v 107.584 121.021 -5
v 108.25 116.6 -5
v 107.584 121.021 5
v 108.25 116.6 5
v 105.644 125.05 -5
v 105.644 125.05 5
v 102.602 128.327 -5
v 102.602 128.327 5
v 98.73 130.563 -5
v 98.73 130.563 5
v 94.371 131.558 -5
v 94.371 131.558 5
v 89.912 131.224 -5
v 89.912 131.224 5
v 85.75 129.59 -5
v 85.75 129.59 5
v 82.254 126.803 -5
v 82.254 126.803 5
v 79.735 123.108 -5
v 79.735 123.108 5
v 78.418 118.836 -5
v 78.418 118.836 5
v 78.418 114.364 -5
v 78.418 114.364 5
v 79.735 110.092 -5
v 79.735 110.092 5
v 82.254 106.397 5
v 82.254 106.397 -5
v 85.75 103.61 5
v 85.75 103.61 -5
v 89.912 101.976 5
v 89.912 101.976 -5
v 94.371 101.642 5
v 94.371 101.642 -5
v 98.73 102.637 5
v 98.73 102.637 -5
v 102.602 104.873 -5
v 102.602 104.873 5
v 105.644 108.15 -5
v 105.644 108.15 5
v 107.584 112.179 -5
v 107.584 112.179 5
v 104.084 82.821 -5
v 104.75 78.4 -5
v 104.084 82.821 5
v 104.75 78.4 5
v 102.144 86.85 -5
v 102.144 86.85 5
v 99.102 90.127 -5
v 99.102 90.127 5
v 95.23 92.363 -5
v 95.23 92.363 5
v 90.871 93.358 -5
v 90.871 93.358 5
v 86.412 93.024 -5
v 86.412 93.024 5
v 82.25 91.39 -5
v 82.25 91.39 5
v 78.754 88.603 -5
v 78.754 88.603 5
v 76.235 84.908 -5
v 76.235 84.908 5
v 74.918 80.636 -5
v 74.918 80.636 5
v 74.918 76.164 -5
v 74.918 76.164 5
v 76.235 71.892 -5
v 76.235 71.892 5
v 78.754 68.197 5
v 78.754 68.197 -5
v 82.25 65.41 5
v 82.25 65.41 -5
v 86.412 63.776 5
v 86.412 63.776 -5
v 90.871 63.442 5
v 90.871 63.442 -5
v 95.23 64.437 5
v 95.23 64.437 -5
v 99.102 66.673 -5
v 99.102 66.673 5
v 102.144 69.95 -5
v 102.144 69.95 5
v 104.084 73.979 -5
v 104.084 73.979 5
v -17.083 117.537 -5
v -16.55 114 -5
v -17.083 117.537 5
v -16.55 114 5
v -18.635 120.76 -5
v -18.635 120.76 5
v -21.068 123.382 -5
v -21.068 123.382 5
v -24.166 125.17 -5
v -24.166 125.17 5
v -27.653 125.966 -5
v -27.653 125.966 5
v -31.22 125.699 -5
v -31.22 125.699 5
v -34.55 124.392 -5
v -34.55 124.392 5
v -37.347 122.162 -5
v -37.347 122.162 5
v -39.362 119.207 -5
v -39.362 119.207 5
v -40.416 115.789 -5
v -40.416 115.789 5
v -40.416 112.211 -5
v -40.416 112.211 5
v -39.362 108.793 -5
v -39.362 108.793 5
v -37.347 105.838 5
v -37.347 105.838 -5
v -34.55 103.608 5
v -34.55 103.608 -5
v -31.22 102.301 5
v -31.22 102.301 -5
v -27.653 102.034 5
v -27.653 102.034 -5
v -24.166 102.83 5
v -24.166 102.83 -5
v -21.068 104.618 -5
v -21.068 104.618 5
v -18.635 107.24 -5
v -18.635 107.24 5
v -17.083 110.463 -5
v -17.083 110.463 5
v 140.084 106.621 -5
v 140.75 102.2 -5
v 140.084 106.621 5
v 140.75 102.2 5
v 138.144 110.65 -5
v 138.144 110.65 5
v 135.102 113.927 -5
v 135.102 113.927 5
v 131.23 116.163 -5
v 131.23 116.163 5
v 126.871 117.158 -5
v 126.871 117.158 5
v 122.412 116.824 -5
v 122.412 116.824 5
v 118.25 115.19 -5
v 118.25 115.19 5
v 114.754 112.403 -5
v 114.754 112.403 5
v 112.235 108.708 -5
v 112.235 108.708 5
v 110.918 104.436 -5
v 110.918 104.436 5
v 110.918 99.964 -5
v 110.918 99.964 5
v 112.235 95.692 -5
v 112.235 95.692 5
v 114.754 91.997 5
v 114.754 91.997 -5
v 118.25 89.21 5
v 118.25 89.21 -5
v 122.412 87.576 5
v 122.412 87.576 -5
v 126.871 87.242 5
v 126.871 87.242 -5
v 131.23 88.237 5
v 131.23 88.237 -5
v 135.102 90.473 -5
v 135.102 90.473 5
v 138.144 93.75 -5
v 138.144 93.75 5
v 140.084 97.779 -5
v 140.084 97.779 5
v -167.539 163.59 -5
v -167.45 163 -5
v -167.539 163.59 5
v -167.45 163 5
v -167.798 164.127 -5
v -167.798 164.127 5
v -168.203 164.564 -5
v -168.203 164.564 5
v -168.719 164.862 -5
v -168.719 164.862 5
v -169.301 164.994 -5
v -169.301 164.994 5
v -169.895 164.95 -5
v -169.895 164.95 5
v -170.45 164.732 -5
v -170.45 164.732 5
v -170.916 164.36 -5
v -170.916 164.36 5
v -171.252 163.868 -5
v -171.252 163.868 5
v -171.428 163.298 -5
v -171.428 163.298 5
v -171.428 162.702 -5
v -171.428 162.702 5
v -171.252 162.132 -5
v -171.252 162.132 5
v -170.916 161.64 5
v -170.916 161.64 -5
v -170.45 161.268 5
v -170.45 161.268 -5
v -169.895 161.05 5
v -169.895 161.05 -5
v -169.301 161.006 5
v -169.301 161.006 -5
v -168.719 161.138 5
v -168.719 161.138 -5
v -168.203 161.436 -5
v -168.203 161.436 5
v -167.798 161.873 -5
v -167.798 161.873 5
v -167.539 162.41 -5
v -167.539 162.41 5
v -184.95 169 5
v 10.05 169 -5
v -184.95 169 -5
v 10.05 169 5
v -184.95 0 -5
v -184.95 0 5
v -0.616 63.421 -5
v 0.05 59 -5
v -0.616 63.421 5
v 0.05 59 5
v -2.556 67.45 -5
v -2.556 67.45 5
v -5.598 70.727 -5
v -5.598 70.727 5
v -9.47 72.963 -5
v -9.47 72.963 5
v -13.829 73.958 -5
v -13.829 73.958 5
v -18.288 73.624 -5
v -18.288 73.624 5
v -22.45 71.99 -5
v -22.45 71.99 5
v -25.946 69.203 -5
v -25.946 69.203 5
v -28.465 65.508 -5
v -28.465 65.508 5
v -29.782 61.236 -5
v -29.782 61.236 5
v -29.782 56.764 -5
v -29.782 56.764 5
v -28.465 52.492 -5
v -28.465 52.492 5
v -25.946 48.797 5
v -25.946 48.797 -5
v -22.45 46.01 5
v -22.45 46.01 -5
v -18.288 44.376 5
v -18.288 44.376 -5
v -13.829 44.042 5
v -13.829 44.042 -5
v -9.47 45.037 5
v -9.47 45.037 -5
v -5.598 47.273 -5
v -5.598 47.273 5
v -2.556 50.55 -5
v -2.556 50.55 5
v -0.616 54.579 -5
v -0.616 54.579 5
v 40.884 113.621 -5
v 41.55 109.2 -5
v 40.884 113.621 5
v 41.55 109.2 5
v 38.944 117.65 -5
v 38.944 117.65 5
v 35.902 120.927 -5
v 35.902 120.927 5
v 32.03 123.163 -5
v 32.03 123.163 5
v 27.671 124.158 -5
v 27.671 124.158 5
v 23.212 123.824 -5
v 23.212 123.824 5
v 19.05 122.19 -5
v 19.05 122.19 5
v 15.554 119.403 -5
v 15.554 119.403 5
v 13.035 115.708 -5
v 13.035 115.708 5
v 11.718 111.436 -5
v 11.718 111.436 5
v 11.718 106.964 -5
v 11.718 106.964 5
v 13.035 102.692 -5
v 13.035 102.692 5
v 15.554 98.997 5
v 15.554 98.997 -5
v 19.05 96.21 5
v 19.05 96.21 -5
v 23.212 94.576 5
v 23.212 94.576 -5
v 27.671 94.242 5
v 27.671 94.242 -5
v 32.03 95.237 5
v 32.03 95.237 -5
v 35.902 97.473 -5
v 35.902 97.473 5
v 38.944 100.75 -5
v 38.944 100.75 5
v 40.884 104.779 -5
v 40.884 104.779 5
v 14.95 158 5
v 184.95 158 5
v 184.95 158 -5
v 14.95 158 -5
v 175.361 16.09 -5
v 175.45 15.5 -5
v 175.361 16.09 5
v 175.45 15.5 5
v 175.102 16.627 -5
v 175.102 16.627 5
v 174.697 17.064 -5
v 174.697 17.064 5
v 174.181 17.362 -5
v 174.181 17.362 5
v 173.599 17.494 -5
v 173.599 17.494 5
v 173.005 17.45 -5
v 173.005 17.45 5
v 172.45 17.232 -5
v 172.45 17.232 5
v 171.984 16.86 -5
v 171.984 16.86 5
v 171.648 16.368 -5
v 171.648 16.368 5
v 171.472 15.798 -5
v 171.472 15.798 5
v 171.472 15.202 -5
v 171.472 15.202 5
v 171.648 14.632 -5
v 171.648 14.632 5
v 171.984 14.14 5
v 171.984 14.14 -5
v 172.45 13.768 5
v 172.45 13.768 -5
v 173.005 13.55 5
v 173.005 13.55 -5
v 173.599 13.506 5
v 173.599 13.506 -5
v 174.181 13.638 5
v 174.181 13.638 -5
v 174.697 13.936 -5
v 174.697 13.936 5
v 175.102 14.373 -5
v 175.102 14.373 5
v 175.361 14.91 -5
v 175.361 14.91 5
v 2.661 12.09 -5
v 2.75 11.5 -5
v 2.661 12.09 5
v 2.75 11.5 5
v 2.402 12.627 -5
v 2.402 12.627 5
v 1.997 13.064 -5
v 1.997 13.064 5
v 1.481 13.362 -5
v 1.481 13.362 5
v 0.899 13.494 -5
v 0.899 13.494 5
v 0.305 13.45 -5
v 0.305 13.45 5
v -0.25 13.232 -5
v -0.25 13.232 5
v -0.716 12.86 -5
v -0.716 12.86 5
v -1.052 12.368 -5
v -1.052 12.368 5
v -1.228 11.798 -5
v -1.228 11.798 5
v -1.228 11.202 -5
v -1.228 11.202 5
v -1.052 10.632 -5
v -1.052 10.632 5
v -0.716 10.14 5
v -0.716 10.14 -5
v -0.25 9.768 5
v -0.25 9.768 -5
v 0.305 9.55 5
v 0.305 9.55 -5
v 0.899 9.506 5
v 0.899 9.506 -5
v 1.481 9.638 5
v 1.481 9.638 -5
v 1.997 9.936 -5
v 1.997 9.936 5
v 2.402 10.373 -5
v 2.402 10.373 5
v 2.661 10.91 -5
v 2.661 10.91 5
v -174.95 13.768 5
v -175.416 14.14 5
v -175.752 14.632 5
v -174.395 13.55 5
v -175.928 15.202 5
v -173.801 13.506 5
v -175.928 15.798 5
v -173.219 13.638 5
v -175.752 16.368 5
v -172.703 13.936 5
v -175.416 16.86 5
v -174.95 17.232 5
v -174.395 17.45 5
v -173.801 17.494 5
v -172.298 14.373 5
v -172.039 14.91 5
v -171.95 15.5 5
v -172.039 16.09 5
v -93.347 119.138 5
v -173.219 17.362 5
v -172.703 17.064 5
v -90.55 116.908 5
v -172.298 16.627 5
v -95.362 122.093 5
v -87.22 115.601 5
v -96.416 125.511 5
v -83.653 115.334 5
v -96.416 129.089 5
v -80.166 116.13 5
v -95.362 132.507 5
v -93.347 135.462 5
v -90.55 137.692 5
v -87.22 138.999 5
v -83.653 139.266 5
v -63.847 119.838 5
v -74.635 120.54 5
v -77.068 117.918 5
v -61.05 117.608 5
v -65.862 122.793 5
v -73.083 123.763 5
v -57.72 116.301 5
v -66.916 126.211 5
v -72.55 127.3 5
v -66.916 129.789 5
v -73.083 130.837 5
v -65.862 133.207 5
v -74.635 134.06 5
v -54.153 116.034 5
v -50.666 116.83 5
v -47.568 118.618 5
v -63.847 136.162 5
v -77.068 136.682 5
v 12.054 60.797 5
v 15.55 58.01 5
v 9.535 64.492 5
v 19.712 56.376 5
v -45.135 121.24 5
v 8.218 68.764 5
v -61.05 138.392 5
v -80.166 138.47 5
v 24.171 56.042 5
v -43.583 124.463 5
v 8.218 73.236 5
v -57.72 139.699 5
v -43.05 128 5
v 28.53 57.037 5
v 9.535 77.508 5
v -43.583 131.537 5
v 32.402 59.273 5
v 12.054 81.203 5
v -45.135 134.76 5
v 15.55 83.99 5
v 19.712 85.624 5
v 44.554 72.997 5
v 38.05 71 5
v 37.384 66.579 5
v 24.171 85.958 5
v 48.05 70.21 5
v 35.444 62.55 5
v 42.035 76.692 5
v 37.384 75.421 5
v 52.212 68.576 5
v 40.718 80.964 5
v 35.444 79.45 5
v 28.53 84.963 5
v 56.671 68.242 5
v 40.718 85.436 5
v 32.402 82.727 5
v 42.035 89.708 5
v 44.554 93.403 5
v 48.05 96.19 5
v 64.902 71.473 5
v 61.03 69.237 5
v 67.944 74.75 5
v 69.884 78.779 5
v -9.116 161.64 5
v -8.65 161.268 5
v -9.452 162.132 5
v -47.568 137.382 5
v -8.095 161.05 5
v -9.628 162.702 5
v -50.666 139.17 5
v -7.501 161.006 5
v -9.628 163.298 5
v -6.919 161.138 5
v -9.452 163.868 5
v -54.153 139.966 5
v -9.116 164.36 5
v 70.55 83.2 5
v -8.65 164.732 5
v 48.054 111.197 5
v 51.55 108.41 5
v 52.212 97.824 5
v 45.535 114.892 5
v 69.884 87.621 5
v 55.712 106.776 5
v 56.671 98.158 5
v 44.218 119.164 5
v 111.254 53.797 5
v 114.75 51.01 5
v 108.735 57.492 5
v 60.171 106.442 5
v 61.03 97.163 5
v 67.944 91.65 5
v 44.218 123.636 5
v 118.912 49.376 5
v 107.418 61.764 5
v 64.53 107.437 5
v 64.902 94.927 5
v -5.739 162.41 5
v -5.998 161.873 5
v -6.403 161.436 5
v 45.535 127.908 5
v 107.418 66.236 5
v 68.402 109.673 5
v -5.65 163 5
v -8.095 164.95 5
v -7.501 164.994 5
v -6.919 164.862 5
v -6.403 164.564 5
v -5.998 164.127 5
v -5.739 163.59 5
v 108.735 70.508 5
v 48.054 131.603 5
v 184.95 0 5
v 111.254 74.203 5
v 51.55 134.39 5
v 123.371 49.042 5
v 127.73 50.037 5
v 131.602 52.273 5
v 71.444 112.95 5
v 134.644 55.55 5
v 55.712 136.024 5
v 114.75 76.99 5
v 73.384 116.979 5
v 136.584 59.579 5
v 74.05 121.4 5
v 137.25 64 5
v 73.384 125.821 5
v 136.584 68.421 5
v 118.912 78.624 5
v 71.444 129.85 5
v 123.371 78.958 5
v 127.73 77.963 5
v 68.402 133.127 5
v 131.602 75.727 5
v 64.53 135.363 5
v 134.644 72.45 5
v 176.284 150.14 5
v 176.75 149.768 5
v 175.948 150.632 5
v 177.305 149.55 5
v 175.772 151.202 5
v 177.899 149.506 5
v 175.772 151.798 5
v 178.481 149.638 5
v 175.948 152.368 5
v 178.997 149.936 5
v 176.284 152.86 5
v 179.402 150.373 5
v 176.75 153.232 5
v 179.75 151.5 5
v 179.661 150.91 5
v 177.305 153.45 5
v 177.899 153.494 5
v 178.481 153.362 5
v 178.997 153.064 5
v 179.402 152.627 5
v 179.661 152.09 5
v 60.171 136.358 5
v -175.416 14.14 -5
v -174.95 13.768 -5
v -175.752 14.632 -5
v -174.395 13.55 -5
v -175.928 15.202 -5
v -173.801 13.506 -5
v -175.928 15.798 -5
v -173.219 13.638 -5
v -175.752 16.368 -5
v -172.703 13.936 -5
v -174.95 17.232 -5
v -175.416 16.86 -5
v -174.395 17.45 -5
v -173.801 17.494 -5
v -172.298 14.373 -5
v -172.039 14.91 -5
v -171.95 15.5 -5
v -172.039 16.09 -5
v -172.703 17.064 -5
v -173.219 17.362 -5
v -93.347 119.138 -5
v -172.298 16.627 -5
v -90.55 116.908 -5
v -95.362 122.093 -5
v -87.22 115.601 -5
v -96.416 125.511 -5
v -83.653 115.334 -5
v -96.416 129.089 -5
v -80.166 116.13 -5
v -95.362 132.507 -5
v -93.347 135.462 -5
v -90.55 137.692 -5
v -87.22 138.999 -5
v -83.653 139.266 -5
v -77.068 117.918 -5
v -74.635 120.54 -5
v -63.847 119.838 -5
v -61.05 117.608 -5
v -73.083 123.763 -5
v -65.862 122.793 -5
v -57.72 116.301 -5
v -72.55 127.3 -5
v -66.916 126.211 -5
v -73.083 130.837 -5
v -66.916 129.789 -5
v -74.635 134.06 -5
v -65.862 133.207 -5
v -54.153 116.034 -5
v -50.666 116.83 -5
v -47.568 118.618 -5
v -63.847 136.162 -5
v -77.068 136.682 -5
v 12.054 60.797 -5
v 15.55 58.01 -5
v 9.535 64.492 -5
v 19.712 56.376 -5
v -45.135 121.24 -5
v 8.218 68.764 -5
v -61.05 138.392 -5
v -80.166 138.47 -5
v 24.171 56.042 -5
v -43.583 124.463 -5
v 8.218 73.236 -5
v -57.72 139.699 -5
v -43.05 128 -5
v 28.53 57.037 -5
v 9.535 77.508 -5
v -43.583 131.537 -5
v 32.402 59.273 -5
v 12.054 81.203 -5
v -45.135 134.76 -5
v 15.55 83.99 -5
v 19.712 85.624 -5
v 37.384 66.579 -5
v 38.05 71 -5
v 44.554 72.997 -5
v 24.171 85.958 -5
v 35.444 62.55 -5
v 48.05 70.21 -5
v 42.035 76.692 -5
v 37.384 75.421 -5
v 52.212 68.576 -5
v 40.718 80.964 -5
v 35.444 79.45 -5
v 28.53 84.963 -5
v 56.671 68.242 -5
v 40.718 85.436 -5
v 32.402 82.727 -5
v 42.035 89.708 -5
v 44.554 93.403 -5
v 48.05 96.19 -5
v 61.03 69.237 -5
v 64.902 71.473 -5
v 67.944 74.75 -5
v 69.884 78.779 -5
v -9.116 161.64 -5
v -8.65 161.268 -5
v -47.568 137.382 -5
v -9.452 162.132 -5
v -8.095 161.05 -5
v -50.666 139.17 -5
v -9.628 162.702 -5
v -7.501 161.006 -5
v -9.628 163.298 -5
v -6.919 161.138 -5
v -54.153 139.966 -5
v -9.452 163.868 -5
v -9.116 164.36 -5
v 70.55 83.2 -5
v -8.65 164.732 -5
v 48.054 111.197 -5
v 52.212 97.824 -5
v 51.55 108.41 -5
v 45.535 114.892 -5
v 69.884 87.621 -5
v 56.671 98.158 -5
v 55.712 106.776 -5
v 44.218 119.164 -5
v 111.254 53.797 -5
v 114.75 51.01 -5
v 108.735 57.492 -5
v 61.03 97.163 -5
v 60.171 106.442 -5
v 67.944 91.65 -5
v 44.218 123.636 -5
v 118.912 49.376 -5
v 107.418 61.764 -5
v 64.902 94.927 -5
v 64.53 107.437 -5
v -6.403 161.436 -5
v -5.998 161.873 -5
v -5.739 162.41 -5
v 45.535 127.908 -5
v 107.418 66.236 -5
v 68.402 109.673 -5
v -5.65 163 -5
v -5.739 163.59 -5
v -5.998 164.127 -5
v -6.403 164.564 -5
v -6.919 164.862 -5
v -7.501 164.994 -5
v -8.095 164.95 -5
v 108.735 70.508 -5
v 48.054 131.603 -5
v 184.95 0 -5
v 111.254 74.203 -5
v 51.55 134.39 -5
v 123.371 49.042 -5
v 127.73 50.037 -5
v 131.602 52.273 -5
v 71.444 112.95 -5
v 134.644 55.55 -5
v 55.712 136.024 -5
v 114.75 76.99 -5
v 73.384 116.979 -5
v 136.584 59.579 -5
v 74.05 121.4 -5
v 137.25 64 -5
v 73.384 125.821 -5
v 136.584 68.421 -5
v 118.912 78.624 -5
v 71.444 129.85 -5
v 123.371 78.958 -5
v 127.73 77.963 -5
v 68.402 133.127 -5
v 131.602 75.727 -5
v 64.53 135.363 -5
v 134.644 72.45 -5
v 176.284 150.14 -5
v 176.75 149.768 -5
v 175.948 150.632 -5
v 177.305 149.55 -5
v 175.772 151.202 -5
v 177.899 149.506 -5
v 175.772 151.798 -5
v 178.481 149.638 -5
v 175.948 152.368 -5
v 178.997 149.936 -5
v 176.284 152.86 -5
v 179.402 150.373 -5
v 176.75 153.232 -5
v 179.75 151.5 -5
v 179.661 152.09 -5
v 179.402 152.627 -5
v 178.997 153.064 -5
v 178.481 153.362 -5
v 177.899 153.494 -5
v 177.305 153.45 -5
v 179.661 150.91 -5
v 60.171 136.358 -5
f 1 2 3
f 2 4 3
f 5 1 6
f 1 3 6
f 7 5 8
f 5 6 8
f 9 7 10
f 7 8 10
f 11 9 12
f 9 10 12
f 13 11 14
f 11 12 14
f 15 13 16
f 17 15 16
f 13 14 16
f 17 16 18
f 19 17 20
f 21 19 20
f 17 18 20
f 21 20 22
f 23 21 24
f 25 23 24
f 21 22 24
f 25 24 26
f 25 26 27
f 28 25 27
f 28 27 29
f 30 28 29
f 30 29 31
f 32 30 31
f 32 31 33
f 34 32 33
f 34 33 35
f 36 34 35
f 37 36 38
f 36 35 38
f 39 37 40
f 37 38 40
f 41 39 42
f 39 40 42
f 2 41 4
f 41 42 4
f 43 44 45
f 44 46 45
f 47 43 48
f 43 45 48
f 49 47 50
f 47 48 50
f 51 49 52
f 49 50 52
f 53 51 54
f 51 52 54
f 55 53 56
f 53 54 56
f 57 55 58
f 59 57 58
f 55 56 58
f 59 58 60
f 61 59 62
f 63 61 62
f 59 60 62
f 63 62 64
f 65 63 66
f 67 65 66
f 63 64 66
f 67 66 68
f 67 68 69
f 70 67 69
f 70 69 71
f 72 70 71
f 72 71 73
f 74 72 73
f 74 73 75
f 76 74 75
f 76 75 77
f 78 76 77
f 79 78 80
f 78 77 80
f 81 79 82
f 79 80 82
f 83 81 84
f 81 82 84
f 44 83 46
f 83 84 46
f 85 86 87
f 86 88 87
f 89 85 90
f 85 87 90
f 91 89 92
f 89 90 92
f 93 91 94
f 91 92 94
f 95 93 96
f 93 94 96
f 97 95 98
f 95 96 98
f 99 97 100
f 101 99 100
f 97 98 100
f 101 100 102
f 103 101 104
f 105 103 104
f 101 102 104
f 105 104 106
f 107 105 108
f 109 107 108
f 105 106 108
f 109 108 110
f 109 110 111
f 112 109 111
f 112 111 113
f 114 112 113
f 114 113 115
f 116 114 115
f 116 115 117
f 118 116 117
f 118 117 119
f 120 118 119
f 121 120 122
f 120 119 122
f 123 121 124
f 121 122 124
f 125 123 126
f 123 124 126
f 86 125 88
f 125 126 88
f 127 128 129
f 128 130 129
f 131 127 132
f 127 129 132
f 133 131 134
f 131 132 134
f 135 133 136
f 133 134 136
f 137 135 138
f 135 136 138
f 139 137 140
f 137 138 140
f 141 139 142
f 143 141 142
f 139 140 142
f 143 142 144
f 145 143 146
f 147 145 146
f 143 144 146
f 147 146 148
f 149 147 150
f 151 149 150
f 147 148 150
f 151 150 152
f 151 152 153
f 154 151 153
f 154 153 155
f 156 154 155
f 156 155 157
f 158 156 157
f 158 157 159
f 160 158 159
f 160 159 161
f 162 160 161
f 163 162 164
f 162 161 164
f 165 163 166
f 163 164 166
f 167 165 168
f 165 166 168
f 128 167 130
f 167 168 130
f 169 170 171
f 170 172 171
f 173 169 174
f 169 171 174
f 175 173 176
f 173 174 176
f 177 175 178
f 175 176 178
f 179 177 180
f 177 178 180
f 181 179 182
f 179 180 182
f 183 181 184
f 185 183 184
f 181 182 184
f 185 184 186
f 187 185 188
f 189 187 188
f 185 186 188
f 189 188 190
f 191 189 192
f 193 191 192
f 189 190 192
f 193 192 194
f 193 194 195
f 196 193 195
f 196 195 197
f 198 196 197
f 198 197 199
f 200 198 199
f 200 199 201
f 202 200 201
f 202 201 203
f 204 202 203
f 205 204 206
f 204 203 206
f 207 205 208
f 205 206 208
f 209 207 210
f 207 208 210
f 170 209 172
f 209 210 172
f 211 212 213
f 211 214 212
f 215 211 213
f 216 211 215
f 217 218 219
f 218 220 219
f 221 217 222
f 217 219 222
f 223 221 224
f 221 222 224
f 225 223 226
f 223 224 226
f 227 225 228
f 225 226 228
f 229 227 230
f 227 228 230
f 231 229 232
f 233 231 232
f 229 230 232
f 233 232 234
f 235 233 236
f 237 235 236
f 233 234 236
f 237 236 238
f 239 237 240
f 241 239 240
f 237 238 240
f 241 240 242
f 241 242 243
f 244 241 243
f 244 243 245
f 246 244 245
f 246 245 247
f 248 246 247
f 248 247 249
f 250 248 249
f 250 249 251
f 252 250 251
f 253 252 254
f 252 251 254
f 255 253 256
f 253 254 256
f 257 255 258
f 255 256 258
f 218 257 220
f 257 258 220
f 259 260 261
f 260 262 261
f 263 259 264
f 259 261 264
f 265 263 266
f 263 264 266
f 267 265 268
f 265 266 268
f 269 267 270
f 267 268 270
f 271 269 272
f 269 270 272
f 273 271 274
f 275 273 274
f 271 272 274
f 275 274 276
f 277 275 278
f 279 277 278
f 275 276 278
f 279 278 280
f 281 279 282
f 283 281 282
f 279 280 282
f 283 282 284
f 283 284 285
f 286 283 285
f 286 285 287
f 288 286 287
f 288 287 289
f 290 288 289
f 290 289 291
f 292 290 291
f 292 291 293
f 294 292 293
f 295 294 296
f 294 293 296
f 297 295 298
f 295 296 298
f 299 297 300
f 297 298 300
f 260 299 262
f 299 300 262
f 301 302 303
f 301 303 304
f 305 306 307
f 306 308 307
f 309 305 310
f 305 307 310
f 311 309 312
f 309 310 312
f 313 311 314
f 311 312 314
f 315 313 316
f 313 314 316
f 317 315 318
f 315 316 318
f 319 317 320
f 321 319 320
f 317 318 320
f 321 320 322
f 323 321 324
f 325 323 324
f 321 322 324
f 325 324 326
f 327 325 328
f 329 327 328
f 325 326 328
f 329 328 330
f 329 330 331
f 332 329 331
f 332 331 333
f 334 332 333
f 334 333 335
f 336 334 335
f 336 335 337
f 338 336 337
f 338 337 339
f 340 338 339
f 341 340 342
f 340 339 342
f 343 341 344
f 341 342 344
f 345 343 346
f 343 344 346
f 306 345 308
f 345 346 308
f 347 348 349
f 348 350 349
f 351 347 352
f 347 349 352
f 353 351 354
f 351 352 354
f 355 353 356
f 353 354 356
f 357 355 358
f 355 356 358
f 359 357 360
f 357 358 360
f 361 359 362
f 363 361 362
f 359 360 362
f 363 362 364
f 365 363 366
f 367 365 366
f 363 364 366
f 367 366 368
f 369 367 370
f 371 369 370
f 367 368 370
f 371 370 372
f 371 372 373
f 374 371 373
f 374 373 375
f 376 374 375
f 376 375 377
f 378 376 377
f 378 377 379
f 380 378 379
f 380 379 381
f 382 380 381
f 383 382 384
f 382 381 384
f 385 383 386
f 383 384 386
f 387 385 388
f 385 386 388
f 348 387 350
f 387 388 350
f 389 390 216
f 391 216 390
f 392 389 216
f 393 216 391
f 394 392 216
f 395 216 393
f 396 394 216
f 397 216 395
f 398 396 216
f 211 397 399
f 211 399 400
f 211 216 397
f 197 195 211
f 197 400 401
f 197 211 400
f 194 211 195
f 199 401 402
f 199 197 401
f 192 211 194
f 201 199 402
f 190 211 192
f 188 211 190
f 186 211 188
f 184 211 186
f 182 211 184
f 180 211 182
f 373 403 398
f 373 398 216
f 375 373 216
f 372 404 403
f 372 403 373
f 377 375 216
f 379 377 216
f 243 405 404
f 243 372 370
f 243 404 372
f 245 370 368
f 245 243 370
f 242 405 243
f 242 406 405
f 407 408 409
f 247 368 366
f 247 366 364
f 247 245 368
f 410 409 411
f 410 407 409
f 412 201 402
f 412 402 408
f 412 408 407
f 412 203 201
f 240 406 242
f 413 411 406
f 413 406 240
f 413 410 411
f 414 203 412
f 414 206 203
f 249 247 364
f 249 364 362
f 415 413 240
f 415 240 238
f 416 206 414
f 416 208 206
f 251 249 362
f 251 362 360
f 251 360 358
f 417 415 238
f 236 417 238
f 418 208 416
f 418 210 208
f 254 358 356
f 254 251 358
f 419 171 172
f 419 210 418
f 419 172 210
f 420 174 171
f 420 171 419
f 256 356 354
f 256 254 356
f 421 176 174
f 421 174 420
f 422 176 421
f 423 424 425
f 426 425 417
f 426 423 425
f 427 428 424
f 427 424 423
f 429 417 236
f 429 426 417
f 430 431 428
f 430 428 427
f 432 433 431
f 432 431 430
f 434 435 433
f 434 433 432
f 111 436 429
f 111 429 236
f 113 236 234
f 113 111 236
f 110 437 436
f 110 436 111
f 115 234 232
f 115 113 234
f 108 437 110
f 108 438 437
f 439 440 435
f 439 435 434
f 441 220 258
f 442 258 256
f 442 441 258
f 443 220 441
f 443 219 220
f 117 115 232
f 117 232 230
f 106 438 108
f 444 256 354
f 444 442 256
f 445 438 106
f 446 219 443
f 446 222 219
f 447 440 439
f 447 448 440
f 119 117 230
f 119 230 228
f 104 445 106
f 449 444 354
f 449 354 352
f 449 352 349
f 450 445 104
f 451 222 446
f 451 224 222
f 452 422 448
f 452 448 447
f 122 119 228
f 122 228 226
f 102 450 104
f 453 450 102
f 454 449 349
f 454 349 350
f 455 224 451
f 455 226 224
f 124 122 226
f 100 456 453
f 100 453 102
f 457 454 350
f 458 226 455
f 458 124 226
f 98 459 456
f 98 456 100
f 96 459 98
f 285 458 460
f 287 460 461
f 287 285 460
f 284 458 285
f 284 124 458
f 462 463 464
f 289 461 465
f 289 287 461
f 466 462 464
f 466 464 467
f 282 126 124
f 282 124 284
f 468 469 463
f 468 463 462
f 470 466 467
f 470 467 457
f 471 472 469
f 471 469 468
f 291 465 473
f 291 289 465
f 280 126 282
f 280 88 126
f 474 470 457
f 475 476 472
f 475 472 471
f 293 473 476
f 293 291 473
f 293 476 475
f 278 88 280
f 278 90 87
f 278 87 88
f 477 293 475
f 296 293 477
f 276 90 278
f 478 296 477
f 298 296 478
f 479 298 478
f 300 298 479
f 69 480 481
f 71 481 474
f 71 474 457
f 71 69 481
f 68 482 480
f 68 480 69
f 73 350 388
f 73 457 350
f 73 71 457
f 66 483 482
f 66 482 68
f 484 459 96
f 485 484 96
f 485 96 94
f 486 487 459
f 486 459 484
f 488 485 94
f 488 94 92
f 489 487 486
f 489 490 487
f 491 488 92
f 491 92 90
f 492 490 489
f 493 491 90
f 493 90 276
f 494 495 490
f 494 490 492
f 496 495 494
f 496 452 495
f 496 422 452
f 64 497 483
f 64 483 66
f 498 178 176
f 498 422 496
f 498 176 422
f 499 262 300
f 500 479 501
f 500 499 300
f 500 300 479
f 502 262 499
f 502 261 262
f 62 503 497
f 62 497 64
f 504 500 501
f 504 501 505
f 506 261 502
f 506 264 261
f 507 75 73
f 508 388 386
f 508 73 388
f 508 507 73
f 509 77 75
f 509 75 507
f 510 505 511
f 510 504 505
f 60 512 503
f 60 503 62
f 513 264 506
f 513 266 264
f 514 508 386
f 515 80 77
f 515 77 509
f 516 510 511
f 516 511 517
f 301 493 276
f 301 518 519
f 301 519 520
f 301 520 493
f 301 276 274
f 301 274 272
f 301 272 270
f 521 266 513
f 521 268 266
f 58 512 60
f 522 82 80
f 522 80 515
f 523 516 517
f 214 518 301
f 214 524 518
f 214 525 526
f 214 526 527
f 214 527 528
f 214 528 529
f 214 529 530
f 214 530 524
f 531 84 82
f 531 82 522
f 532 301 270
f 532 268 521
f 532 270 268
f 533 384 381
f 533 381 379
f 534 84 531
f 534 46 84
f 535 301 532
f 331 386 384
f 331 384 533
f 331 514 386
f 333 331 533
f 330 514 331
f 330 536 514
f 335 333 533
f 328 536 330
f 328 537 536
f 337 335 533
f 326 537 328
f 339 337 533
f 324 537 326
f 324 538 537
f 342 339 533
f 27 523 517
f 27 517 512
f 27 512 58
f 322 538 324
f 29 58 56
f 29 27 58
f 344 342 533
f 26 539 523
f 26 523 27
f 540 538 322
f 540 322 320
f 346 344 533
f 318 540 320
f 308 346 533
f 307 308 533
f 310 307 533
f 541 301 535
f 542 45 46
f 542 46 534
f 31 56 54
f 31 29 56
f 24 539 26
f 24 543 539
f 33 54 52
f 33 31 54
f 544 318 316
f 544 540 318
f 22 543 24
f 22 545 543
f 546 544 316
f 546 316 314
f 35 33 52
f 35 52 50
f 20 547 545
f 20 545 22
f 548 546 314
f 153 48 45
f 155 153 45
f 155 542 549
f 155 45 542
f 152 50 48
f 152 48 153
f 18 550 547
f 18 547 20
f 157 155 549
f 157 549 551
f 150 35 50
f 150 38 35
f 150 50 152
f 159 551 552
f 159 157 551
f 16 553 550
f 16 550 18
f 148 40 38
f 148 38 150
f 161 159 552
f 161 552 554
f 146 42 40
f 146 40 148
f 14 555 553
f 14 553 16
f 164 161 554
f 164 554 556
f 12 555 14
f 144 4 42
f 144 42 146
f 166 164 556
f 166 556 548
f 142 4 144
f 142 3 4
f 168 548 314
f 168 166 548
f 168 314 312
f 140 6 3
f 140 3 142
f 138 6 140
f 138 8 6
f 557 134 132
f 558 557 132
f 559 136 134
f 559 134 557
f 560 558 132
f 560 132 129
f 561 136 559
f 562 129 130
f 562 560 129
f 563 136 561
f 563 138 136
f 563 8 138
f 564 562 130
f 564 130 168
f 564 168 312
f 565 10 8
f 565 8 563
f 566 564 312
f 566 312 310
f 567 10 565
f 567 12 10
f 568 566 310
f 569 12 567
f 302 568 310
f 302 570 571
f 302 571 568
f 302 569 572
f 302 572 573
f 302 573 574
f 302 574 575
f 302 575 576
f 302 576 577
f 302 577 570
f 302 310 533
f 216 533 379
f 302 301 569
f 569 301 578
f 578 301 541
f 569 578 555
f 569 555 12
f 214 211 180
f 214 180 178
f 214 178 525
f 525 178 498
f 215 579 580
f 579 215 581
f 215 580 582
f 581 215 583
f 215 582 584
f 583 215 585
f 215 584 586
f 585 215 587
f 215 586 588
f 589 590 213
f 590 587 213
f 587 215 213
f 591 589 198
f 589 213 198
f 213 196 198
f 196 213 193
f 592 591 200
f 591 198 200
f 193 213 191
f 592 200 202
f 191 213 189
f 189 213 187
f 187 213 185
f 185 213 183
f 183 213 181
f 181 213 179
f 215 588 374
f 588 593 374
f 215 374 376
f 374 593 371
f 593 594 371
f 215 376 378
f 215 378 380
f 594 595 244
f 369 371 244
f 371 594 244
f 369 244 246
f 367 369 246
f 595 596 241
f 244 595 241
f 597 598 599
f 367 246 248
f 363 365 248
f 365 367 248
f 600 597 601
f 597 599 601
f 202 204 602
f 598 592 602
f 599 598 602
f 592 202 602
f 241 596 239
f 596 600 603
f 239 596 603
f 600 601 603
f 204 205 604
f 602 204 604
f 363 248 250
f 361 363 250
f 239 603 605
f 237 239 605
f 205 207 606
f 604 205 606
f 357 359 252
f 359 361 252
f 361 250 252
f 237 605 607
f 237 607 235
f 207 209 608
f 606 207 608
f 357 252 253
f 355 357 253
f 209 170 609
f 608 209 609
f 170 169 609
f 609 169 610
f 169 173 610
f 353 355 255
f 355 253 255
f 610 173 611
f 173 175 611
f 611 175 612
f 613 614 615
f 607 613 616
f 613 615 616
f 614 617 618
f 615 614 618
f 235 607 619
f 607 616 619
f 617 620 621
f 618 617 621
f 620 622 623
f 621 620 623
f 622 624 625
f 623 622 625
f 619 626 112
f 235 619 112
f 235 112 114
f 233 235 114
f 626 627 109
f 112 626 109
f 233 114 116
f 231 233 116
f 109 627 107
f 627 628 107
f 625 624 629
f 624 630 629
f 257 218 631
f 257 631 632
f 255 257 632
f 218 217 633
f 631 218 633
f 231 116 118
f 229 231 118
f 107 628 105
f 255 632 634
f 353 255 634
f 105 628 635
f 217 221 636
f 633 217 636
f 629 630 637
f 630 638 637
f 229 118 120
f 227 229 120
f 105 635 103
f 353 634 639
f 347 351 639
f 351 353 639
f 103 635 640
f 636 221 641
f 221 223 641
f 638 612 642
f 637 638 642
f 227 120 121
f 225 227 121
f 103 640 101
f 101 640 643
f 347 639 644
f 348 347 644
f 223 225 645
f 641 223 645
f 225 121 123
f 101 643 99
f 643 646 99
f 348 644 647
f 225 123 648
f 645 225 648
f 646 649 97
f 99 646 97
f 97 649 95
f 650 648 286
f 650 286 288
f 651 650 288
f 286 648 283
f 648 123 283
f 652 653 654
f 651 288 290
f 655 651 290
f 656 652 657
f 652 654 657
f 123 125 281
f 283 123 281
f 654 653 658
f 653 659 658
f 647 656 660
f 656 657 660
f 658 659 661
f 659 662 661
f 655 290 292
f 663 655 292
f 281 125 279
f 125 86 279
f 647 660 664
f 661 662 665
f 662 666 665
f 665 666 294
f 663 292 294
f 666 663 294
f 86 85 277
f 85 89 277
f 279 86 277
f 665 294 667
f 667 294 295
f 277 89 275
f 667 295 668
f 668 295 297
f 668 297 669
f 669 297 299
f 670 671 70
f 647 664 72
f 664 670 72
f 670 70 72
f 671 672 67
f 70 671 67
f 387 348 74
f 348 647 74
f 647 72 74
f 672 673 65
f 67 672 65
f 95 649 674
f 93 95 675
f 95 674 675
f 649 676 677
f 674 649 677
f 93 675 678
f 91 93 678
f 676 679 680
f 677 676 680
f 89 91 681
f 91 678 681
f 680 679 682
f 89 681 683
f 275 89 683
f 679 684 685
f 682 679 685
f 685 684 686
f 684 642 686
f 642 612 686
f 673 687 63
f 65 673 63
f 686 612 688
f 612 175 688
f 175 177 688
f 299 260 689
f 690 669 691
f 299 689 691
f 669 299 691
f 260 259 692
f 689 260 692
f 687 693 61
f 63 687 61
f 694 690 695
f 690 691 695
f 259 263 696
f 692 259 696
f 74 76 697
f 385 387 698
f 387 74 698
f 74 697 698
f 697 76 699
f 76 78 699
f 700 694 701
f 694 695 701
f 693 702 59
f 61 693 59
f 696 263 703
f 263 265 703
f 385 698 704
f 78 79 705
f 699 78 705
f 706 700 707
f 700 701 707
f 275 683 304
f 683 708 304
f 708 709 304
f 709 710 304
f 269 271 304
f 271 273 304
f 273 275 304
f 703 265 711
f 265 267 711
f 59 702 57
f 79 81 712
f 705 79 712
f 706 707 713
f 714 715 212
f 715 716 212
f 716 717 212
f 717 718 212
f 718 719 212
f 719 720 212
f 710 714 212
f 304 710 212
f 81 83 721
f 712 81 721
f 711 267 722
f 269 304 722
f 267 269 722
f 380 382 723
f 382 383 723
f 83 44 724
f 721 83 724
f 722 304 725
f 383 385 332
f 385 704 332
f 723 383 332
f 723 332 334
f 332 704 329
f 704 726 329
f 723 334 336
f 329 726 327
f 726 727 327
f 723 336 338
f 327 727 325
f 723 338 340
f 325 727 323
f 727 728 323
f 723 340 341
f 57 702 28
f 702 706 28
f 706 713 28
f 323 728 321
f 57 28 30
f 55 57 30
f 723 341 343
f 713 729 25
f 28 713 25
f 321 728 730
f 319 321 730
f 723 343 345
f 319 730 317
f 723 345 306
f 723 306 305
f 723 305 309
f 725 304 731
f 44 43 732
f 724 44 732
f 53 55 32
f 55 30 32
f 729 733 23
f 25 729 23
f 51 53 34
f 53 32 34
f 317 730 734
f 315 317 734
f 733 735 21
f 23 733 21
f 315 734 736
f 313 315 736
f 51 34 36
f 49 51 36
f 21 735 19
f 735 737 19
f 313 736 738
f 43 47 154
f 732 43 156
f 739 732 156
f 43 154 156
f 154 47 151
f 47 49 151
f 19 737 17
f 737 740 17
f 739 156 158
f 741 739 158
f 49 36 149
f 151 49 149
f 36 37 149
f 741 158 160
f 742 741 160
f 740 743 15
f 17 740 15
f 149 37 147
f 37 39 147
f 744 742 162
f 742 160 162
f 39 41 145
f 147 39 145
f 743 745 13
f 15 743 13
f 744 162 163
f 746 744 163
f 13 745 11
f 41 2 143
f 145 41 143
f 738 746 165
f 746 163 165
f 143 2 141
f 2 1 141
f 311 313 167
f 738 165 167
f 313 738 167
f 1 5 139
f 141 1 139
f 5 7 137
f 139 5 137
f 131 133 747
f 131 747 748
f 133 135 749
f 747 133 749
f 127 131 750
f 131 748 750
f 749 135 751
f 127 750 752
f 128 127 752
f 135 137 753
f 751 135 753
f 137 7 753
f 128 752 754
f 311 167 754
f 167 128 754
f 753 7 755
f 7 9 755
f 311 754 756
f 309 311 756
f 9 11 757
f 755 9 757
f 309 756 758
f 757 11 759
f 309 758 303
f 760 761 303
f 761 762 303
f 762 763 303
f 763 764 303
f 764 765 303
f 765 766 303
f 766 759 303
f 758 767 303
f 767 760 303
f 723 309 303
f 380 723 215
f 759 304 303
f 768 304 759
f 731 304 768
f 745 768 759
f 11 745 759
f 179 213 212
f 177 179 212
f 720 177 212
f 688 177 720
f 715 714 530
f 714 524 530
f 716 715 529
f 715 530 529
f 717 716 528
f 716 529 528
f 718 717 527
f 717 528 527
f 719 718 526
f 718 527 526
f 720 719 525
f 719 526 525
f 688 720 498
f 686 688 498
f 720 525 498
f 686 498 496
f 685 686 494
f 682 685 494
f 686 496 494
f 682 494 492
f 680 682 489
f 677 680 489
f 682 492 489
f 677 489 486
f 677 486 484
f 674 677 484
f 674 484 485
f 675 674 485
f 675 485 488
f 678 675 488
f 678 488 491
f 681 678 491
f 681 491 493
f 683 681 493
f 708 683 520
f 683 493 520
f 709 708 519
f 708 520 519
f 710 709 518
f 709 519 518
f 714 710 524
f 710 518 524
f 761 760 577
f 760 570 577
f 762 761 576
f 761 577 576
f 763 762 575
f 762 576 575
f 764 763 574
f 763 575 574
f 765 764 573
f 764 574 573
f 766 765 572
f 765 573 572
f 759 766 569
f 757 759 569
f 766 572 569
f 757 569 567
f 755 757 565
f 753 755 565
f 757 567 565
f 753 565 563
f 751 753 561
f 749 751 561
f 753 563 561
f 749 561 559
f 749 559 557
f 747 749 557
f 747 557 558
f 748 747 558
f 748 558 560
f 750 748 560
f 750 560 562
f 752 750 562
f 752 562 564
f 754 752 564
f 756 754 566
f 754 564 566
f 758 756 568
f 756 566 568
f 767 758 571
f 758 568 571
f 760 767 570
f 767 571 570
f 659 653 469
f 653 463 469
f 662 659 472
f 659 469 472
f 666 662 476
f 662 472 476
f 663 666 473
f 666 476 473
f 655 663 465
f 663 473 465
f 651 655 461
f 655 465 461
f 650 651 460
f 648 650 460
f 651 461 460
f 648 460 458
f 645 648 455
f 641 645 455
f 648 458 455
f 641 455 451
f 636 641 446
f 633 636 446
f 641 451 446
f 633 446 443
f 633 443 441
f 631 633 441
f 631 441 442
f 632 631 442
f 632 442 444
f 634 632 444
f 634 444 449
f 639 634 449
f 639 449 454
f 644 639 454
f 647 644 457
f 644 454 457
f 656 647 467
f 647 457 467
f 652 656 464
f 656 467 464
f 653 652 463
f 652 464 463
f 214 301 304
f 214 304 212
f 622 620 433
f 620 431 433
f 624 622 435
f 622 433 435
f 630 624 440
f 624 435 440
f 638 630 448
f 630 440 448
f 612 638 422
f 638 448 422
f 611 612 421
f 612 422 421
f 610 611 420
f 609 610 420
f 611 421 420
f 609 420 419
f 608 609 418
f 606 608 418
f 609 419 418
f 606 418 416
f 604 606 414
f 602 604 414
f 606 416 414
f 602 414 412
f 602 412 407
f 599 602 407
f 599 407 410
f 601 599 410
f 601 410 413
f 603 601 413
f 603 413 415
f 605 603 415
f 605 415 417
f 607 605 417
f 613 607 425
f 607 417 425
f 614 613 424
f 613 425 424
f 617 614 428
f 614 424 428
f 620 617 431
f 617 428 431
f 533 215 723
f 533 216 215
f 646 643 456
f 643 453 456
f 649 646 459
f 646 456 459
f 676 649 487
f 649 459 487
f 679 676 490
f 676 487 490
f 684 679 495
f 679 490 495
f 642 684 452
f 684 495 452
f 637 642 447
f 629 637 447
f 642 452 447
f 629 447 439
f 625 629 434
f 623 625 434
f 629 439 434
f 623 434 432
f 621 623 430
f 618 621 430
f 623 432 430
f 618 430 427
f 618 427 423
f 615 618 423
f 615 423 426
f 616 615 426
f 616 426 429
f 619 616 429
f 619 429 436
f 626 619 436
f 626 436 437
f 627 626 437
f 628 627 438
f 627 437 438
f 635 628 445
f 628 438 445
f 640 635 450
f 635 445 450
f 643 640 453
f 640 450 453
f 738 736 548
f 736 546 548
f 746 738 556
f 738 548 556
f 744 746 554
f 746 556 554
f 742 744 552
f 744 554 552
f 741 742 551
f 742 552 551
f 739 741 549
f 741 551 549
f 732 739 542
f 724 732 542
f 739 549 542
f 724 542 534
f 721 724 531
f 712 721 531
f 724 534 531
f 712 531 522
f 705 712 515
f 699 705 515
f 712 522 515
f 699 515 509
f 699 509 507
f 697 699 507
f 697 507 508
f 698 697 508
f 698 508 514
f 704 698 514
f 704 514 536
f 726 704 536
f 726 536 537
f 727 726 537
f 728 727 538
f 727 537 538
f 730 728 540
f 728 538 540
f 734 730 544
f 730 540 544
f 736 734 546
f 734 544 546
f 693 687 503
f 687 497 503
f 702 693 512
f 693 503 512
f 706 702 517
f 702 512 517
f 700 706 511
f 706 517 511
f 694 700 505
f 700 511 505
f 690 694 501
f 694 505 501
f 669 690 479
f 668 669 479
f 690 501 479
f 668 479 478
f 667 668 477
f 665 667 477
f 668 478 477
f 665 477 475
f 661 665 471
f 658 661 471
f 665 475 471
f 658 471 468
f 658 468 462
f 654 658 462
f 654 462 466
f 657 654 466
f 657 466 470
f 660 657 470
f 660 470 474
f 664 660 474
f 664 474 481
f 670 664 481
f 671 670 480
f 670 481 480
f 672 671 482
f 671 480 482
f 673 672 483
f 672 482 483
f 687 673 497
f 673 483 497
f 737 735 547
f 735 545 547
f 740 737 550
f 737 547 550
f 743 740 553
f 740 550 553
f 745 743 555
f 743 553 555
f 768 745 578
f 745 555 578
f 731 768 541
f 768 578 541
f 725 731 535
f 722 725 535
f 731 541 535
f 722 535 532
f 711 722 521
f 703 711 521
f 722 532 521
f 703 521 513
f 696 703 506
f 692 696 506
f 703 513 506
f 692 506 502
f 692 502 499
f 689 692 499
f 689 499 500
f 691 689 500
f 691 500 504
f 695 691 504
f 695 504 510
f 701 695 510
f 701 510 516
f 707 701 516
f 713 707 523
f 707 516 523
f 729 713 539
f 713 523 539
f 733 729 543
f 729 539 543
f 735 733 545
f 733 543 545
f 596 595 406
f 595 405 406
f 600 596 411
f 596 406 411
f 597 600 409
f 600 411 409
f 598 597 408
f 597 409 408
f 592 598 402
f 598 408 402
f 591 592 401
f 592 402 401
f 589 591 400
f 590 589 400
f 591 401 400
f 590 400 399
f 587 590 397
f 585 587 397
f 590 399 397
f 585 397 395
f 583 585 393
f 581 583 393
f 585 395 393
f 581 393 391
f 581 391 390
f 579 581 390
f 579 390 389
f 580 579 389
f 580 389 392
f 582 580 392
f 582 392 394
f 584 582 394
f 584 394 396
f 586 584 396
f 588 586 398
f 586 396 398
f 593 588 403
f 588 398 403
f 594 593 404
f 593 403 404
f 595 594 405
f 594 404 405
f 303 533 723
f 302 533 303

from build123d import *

# Parameters (mm, degrees)
BOSS_EXTRUDE1_DEPTH     = 5
SKETCH2_R               = 15
SKETCH2_R_2             = 12
SKETCH2_R_3             = 2
CUT_EXTRUDE1_DEPTH      = 6
CUT_EXTRUDE1_DEPTH_BACK = 6


with BuildPart() as part:
    # Sketch1 → Boss-Extrude1 (new body, symmetric)
    with BuildSketch(Plane.XY):
        Polygon((-184.95, 0), (184.95, 0), (184.95, 158), (14.95, 158), (10.05, 169), (-184.95, 169), align=None)
    extrude(amount=BOSS_EXTRUDE1_DEPTH, both=True)

    # Sketch2 → Cut-Extrude1 (cut, two sides)
    with BuildSketch(Plane.XY) as cut_extrude1_sk:
        with Locations((23.05, 71)):
            Circle(SKETCH2_R)
        with Locations((55.55, 83.2)):
            Circle(SKETCH2_R)
        with Locations((89.75, 78.4)):
            Circle(SKETCH2_R)
        with Locations((122.25, 64)):
            Circle(SKETCH2_R)
        with Locations((26.55, 109.2)):
            Circle(SKETCH2_R)
        with Locations((59.05, 121.4)):
            Circle(SKETCH2_R)
        with Locations((93.25, 116.6)):
            Circle(SKETCH2_R)
        with Locations((125.75, 102.2)):
            Circle(SKETCH2_R)
        with Locations((-14.95, 59)):
            Circle(SKETCH2_R)
        with Locations((-28.55, 114)):
            Circle(SKETCH2_R_2)
        with Locations((-55.05, 128)):
            Circle(SKETCH2_R_2)
        with Locations((-84.55, 127.3)):
            Circle(SKETCH2_R_2)
        with Locations((-7.65, 163)):
            Circle(SKETCH2_R_3)
        with Locations((-169.45, 163)):
            Circle(SKETCH2_R_3)
        with Locations((-173.95, 15.5)):
            Circle(SKETCH2_R_3)
        with Locations((0.75, 11.5)):
            Circle(SKETCH2_R_3)
        with Locations((173.45, 15.5)):
            Circle(SKETCH2_R_3)
        with Locations((177.75, 151.5)):
            Circle(SKETCH2_R_3)
    extrude(amount=CUT_EXTRUDE1_DEPTH, mode=Mode.SUBTRACT)
    extrude(cut_extrude1_sk.sketch, amount=-CUT_EXTRUDE1_DEPTH_BACK, mode=Mode.SUBTRACT)


solid = part.part
